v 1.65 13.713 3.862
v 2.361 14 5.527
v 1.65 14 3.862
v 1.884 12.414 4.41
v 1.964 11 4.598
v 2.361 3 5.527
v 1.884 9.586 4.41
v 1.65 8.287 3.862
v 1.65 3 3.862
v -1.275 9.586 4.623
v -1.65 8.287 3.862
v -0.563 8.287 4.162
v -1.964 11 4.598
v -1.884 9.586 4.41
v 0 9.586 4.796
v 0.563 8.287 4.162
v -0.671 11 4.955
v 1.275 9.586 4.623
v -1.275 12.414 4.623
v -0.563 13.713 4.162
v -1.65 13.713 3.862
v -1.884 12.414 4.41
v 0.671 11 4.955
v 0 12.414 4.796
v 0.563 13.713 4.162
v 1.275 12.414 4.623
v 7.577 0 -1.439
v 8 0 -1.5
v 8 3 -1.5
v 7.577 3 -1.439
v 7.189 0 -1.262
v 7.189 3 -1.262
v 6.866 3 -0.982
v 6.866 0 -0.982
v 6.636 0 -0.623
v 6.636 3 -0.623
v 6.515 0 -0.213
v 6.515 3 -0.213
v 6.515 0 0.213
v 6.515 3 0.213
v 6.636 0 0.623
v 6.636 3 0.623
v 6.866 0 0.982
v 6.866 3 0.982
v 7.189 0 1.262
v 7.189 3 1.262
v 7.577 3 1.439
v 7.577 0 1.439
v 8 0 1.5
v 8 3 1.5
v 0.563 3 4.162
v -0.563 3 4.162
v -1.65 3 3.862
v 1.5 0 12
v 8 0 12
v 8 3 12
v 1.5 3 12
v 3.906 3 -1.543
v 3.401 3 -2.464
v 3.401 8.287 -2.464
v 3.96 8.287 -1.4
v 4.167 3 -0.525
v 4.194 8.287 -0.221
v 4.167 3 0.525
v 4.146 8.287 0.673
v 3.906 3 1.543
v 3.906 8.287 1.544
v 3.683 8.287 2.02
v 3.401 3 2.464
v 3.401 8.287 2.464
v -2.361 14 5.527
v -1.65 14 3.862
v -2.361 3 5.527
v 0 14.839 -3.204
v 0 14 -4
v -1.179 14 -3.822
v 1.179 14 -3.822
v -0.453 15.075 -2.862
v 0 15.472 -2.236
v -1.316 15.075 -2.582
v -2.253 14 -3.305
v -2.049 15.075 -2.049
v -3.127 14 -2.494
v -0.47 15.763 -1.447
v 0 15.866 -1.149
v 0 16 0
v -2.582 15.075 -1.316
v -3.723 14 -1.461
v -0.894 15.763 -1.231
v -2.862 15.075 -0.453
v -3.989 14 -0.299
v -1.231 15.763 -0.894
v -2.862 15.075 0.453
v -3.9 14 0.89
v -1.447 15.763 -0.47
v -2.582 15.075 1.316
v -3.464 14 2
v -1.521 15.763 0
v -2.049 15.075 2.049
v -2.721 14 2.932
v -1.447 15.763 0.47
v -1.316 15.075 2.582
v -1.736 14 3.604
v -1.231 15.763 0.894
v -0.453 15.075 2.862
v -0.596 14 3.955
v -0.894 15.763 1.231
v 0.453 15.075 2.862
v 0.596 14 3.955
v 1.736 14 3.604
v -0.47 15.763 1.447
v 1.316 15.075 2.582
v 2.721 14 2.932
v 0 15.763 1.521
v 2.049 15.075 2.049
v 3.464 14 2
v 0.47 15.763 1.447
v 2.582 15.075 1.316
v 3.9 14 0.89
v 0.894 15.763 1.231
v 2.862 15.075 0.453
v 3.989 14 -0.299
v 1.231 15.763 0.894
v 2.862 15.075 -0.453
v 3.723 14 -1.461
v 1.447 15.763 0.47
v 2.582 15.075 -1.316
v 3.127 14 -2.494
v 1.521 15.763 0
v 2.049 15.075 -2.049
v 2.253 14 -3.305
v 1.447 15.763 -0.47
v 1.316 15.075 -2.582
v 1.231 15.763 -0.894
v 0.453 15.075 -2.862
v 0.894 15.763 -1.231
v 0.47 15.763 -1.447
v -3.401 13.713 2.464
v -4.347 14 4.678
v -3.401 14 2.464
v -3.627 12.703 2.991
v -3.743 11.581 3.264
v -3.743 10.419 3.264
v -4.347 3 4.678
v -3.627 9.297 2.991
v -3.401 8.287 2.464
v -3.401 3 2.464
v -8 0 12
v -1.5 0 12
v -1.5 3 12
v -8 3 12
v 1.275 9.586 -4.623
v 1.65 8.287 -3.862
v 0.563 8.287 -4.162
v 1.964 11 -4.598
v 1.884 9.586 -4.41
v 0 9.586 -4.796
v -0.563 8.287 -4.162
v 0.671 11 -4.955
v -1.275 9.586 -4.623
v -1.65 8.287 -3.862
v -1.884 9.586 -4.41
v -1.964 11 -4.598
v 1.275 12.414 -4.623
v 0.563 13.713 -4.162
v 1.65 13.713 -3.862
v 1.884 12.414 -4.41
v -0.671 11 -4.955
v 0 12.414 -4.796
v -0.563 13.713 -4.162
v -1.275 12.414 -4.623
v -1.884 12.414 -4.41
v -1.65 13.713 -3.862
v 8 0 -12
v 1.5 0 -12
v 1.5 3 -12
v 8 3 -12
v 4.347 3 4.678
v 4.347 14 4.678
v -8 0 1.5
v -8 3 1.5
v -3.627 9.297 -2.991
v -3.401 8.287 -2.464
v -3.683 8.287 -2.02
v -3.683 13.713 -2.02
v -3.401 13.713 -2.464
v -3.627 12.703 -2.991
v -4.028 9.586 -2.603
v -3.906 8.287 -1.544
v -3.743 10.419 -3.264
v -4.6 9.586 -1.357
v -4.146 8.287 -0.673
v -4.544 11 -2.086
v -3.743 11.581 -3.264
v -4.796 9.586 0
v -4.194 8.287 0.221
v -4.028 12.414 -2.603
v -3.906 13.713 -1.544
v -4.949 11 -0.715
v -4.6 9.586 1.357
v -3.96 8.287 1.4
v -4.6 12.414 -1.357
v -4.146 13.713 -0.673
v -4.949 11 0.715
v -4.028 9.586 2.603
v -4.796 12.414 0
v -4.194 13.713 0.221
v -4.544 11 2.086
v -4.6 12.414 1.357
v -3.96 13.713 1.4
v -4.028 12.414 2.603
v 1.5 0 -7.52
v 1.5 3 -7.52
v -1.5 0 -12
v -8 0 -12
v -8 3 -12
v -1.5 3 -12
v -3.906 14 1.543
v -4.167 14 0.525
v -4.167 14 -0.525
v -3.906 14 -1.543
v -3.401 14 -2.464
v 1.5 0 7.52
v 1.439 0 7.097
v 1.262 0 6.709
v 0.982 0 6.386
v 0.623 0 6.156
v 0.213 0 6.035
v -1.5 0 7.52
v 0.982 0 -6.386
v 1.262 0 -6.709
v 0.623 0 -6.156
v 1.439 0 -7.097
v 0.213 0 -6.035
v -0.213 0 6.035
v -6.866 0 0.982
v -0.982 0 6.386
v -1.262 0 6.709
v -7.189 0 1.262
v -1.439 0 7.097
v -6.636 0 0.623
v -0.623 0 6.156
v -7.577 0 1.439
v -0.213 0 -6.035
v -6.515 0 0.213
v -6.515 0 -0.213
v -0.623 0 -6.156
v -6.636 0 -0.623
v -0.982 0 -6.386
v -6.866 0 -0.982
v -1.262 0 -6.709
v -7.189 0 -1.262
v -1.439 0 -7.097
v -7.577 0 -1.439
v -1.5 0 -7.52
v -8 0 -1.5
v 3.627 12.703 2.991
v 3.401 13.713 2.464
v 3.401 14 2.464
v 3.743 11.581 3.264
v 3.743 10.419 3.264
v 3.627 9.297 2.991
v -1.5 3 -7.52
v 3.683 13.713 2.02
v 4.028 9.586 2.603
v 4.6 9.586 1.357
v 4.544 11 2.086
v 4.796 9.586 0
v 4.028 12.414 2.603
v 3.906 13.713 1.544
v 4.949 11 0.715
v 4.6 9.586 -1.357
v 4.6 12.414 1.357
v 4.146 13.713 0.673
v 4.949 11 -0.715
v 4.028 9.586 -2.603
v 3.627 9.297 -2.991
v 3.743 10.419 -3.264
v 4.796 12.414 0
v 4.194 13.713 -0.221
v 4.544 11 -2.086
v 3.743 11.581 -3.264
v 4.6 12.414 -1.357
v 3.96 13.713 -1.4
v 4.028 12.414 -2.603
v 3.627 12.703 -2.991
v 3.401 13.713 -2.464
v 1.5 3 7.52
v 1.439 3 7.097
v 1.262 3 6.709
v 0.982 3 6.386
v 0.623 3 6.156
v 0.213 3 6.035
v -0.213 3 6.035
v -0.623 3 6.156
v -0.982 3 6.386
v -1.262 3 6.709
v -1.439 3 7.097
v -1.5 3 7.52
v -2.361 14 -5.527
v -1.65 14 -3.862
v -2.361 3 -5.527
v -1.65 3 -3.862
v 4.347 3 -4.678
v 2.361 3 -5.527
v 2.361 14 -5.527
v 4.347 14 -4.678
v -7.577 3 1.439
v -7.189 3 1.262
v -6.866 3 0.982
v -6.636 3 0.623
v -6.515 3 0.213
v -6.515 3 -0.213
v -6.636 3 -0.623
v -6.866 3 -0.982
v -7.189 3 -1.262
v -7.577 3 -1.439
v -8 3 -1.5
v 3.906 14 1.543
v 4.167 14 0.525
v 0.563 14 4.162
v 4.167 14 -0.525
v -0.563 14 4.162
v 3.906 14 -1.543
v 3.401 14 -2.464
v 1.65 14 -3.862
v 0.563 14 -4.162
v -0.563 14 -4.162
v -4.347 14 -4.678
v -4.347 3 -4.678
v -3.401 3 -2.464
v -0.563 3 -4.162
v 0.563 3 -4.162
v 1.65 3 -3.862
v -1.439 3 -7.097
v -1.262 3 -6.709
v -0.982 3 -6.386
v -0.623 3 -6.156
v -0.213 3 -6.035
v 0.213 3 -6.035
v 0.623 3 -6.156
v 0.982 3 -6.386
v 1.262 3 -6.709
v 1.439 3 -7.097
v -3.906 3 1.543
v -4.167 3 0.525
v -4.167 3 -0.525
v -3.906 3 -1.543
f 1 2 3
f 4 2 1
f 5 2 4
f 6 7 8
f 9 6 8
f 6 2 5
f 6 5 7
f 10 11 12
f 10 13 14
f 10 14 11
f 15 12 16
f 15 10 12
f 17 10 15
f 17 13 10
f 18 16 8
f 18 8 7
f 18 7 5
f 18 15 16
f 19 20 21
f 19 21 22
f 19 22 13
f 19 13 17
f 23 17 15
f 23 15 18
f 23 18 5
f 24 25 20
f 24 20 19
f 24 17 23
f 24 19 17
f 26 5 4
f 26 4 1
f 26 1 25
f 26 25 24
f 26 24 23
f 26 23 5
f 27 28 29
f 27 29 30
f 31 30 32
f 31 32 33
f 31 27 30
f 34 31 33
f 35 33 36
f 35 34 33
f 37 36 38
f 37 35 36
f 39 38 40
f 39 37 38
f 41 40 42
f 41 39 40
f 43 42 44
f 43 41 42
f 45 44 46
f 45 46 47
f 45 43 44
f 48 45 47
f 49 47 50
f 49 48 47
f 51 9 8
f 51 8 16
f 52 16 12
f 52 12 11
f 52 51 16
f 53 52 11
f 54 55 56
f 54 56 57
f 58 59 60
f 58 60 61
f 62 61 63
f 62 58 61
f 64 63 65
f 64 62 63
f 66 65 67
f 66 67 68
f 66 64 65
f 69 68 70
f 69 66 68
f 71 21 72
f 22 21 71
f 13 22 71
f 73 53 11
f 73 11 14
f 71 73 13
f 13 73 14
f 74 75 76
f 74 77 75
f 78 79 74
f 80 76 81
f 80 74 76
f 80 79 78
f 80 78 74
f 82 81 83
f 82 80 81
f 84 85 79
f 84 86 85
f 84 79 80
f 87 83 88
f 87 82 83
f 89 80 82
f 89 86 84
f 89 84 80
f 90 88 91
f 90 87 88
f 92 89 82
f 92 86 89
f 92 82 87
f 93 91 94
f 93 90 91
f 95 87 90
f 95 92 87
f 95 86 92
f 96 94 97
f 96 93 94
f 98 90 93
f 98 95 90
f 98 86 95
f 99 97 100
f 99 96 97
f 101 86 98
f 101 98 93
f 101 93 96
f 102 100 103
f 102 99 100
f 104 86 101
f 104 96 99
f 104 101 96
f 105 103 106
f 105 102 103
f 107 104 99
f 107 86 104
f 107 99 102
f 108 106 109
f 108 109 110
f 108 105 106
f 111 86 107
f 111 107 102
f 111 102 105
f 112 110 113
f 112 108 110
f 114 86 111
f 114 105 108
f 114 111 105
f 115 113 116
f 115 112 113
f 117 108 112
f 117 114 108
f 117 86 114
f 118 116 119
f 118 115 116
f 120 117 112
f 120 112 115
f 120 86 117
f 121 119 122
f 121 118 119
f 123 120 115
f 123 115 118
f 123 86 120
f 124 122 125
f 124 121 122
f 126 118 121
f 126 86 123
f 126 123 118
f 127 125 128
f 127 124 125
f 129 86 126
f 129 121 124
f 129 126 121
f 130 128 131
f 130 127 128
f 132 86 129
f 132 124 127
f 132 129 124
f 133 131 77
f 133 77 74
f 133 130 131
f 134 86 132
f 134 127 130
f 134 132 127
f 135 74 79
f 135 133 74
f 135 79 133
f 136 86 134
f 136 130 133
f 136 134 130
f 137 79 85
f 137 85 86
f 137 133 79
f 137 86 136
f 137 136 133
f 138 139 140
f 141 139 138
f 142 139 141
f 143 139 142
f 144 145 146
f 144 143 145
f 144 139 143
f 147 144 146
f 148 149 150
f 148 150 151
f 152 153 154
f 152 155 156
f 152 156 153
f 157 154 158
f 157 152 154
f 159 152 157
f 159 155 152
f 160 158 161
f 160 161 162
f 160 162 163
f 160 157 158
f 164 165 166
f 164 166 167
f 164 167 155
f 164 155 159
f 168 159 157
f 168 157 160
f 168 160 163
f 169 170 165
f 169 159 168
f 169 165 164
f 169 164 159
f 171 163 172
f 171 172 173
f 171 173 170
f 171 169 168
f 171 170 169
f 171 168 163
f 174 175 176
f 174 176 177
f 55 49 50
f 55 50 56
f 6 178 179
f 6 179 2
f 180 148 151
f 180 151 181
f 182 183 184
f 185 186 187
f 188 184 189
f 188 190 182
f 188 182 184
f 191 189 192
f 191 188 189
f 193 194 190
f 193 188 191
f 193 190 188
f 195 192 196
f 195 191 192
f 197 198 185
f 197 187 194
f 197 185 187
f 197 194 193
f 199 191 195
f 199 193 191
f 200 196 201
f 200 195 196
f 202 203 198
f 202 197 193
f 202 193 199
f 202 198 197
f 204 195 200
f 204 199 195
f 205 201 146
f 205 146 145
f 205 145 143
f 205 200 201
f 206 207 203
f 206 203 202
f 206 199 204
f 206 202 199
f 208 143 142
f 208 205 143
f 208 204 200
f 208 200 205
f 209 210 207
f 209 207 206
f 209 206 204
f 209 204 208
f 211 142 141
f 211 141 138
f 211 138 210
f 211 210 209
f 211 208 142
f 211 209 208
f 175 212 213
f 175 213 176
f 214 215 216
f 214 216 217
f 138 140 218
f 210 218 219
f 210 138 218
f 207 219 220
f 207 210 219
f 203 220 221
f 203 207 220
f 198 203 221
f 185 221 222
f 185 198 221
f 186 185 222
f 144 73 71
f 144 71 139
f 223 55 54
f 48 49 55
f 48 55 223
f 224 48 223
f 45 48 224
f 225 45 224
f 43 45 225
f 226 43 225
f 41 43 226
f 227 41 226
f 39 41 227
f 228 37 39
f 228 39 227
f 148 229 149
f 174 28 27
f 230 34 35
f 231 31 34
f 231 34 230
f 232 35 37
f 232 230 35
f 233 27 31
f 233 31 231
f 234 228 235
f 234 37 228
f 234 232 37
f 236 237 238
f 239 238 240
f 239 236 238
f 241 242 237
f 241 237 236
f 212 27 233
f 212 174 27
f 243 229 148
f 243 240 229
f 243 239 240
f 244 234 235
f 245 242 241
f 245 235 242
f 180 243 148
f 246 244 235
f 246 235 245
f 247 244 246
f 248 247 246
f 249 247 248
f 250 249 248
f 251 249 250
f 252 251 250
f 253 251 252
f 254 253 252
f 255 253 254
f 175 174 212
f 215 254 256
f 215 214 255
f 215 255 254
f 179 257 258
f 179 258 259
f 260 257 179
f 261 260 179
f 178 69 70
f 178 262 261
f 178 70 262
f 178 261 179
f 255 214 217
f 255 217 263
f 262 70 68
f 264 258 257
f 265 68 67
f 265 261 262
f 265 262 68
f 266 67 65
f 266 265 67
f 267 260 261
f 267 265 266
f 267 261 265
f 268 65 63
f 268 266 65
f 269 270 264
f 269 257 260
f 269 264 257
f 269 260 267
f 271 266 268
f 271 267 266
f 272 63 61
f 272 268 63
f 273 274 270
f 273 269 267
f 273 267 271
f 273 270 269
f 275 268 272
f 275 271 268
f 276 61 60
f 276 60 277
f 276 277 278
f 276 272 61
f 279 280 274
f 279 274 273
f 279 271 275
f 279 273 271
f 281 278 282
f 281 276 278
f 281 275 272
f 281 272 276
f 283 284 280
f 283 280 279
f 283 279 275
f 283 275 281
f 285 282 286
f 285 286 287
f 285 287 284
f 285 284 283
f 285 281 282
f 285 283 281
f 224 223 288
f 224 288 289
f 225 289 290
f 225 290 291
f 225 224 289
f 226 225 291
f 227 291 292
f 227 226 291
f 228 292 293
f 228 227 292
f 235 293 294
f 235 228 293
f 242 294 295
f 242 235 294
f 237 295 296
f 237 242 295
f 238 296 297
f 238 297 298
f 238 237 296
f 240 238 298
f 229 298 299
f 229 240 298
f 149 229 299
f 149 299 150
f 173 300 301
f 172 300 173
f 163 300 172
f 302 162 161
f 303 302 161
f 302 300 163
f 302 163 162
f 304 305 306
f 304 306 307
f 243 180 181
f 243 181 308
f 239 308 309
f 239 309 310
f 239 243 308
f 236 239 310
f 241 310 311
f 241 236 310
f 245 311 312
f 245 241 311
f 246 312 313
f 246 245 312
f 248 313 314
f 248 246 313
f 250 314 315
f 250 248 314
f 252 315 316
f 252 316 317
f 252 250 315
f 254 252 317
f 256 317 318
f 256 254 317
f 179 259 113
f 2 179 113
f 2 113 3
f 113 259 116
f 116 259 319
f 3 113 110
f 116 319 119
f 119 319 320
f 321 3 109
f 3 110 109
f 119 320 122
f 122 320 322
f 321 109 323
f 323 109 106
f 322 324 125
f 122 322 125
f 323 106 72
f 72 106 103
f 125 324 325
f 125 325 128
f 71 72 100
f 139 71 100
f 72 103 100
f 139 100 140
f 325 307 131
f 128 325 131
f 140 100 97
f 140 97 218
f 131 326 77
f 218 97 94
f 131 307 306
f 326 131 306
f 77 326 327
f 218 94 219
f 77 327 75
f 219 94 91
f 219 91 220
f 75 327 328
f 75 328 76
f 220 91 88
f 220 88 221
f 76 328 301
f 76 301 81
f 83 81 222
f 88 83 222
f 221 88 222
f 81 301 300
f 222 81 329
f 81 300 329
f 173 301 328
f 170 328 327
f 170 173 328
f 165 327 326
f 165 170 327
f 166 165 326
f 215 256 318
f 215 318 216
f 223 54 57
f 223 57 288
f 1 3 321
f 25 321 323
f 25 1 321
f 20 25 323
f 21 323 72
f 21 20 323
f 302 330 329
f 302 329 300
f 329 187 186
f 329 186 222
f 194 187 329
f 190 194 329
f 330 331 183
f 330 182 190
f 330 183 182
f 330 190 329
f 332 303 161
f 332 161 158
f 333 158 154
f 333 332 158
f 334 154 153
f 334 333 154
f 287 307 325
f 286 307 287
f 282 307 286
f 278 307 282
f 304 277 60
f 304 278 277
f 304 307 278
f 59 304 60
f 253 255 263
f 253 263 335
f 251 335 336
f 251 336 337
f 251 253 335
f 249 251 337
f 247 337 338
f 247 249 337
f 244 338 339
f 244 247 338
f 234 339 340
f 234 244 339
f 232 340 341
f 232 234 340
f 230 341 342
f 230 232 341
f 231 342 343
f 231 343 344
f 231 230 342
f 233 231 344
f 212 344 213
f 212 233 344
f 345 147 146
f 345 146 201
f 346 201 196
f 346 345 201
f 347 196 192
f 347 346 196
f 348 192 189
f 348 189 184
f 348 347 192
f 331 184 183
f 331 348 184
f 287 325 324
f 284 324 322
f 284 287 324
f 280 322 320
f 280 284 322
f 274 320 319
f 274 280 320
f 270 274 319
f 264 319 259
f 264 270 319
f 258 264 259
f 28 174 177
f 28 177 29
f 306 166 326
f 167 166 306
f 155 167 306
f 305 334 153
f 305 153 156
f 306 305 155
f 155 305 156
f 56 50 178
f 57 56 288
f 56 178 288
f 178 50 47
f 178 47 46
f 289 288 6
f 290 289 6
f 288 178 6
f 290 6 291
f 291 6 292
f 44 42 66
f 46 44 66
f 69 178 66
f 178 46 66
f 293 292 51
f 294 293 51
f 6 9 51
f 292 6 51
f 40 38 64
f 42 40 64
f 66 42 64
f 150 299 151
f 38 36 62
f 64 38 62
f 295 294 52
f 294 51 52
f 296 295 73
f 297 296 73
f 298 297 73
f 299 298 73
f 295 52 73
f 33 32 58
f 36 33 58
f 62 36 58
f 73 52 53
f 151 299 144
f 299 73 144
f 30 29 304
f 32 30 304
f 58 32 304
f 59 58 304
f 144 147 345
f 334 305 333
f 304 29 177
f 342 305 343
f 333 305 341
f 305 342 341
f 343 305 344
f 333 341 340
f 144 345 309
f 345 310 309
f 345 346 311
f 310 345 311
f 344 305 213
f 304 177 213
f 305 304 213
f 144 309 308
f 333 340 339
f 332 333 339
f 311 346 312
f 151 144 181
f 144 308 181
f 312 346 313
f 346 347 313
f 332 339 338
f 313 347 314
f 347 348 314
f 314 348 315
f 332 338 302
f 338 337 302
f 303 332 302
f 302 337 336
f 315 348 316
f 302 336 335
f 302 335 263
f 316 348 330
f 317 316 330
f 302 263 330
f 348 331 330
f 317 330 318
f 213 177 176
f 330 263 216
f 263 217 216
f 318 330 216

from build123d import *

# Parameters (mm, degrees)
EXTRUDE_1_DEPTH = 3
EXTRUDE_2_DEPTH = 11


with BuildPart() as part:
    # 草图1 → 凸台-拉伸1 (new body)
    with BuildSketch(Plane(origin=(0, 0, 0), x_dir=(1, 0, 0), z_dir=(0, 1, 0))):
        with BuildLine():
            Line((1.5, 12), (8, 12))
            Line((8, 12), (8, 1.5))
            ThreePointArc((8, 1.5), (6.5, 0), (8, -1.5))
            Line((8, -1.5), (8, -12))
            Line((8, -12), (1.5, -12))
            Line((1.5, -12), (1.5, -7.52))
            ThreePointArc((1.5, -7.52), (0, -6.02), (-1.5, -7.52))
            Line((-1.5, -7.52), (-1.5, -12))
            Line((-1.5, -12), (-8, -12))
            Line((-8, -12), (-8, -1.5))
            ThreePointArc((-8, -1.5), (-6.5, 0), (-8, 1.5))
            Line((-8, 1.5), (-8, 12))
            Line((-8, 12), (-1.5, 12))
            Line((-1.5, 12), (-1.5, 7.52))
            ThreePointArc((-1.5, 7.52), (0, 6.02), (1.5, 7.52))
            Line((1.5, 7.52), (1.5, 12))
        make_face()
    extrude(amount=EXTRUDE_1_DEPTH)



with BuildPart() as body_2:
    # 草图2 → 旋转1 (revolve)
    with BuildSketch(Plane(origin=(0, 0, 0), x_dir=(0, 0, -1), z_dir=(1, 0, 0))):
        with BuildLine():
            Line((0, 16), (0, 6))
            ThreePointArc((0, 6), (5, 11), (0, 16))
        make_face()
    revolve(axis=Axis((0, 3, 0), (0, 1, 0)))


with BuildPart() as part_1:
    add(part.part)

    add(body_2.part)  # 凸台-拉伸2 merges body 2
    # 草图3 → 凸台-拉伸2 (add)
    with BuildSketch(Plane(origin=(0, 3, 0), x_dir=(1, 0, 0), z_dir=(0, 1, 0))):
        with BuildLine():
            Line((1.649838457, 3.862386965), (2.360840268, 5.526891824))
            Line((2.360840268, 5.526891824), (4.347210707, 4.678403474))
            Line((4.347210707, 4.678403474), (3.401303107, 2.46396777))
            ThreePointArc((3.401303107, 2.46396777), (4.2, 0), (3.401303107, -2.46396777))
            Line((3.401303107, -2.46396777), (4.347210707, -4.678403474))
            Line((4.347210707, -4.678403474), (2.360840268, -5.526891824))
            Line((2.360840268, -5.526891824), (1.649838457, -3.862386965))
            ThreePointArc((1.649838457, -3.862386965), (0, -4.2), (-1.649838457, -3.862386965))
            Line((-1.649838457, -3.862386965), (-2.360840268, -5.526891824))
            Line((-2.360840268, -5.526891824), (-4.347210707, -4.678403474))
            Line((-4.347210707, -4.678403474), (-3.401303107, -2.46396777))
            ThreePointArc((-3.401303107, -2.46396777), (-4.2, 0), (-3.401303107, 2.46396777))
            Line((-3.401303107, 2.46396777), (-4.347210707, 4.678403474))
            Line((-4.347210707, 4.678403474), (-2.360840268, 5.526891824))
            Line((-2.360840268, 5.526891824), (-1.649838457, 3.862386965))
            ThreePointArc((-1.649838457, 3.862386965), (0, 4.2), (1.649838457, 3.862386965))
        make_face()
    extrude(amount=EXTRUDE_2_DEPTH)


solid = part_1.part
